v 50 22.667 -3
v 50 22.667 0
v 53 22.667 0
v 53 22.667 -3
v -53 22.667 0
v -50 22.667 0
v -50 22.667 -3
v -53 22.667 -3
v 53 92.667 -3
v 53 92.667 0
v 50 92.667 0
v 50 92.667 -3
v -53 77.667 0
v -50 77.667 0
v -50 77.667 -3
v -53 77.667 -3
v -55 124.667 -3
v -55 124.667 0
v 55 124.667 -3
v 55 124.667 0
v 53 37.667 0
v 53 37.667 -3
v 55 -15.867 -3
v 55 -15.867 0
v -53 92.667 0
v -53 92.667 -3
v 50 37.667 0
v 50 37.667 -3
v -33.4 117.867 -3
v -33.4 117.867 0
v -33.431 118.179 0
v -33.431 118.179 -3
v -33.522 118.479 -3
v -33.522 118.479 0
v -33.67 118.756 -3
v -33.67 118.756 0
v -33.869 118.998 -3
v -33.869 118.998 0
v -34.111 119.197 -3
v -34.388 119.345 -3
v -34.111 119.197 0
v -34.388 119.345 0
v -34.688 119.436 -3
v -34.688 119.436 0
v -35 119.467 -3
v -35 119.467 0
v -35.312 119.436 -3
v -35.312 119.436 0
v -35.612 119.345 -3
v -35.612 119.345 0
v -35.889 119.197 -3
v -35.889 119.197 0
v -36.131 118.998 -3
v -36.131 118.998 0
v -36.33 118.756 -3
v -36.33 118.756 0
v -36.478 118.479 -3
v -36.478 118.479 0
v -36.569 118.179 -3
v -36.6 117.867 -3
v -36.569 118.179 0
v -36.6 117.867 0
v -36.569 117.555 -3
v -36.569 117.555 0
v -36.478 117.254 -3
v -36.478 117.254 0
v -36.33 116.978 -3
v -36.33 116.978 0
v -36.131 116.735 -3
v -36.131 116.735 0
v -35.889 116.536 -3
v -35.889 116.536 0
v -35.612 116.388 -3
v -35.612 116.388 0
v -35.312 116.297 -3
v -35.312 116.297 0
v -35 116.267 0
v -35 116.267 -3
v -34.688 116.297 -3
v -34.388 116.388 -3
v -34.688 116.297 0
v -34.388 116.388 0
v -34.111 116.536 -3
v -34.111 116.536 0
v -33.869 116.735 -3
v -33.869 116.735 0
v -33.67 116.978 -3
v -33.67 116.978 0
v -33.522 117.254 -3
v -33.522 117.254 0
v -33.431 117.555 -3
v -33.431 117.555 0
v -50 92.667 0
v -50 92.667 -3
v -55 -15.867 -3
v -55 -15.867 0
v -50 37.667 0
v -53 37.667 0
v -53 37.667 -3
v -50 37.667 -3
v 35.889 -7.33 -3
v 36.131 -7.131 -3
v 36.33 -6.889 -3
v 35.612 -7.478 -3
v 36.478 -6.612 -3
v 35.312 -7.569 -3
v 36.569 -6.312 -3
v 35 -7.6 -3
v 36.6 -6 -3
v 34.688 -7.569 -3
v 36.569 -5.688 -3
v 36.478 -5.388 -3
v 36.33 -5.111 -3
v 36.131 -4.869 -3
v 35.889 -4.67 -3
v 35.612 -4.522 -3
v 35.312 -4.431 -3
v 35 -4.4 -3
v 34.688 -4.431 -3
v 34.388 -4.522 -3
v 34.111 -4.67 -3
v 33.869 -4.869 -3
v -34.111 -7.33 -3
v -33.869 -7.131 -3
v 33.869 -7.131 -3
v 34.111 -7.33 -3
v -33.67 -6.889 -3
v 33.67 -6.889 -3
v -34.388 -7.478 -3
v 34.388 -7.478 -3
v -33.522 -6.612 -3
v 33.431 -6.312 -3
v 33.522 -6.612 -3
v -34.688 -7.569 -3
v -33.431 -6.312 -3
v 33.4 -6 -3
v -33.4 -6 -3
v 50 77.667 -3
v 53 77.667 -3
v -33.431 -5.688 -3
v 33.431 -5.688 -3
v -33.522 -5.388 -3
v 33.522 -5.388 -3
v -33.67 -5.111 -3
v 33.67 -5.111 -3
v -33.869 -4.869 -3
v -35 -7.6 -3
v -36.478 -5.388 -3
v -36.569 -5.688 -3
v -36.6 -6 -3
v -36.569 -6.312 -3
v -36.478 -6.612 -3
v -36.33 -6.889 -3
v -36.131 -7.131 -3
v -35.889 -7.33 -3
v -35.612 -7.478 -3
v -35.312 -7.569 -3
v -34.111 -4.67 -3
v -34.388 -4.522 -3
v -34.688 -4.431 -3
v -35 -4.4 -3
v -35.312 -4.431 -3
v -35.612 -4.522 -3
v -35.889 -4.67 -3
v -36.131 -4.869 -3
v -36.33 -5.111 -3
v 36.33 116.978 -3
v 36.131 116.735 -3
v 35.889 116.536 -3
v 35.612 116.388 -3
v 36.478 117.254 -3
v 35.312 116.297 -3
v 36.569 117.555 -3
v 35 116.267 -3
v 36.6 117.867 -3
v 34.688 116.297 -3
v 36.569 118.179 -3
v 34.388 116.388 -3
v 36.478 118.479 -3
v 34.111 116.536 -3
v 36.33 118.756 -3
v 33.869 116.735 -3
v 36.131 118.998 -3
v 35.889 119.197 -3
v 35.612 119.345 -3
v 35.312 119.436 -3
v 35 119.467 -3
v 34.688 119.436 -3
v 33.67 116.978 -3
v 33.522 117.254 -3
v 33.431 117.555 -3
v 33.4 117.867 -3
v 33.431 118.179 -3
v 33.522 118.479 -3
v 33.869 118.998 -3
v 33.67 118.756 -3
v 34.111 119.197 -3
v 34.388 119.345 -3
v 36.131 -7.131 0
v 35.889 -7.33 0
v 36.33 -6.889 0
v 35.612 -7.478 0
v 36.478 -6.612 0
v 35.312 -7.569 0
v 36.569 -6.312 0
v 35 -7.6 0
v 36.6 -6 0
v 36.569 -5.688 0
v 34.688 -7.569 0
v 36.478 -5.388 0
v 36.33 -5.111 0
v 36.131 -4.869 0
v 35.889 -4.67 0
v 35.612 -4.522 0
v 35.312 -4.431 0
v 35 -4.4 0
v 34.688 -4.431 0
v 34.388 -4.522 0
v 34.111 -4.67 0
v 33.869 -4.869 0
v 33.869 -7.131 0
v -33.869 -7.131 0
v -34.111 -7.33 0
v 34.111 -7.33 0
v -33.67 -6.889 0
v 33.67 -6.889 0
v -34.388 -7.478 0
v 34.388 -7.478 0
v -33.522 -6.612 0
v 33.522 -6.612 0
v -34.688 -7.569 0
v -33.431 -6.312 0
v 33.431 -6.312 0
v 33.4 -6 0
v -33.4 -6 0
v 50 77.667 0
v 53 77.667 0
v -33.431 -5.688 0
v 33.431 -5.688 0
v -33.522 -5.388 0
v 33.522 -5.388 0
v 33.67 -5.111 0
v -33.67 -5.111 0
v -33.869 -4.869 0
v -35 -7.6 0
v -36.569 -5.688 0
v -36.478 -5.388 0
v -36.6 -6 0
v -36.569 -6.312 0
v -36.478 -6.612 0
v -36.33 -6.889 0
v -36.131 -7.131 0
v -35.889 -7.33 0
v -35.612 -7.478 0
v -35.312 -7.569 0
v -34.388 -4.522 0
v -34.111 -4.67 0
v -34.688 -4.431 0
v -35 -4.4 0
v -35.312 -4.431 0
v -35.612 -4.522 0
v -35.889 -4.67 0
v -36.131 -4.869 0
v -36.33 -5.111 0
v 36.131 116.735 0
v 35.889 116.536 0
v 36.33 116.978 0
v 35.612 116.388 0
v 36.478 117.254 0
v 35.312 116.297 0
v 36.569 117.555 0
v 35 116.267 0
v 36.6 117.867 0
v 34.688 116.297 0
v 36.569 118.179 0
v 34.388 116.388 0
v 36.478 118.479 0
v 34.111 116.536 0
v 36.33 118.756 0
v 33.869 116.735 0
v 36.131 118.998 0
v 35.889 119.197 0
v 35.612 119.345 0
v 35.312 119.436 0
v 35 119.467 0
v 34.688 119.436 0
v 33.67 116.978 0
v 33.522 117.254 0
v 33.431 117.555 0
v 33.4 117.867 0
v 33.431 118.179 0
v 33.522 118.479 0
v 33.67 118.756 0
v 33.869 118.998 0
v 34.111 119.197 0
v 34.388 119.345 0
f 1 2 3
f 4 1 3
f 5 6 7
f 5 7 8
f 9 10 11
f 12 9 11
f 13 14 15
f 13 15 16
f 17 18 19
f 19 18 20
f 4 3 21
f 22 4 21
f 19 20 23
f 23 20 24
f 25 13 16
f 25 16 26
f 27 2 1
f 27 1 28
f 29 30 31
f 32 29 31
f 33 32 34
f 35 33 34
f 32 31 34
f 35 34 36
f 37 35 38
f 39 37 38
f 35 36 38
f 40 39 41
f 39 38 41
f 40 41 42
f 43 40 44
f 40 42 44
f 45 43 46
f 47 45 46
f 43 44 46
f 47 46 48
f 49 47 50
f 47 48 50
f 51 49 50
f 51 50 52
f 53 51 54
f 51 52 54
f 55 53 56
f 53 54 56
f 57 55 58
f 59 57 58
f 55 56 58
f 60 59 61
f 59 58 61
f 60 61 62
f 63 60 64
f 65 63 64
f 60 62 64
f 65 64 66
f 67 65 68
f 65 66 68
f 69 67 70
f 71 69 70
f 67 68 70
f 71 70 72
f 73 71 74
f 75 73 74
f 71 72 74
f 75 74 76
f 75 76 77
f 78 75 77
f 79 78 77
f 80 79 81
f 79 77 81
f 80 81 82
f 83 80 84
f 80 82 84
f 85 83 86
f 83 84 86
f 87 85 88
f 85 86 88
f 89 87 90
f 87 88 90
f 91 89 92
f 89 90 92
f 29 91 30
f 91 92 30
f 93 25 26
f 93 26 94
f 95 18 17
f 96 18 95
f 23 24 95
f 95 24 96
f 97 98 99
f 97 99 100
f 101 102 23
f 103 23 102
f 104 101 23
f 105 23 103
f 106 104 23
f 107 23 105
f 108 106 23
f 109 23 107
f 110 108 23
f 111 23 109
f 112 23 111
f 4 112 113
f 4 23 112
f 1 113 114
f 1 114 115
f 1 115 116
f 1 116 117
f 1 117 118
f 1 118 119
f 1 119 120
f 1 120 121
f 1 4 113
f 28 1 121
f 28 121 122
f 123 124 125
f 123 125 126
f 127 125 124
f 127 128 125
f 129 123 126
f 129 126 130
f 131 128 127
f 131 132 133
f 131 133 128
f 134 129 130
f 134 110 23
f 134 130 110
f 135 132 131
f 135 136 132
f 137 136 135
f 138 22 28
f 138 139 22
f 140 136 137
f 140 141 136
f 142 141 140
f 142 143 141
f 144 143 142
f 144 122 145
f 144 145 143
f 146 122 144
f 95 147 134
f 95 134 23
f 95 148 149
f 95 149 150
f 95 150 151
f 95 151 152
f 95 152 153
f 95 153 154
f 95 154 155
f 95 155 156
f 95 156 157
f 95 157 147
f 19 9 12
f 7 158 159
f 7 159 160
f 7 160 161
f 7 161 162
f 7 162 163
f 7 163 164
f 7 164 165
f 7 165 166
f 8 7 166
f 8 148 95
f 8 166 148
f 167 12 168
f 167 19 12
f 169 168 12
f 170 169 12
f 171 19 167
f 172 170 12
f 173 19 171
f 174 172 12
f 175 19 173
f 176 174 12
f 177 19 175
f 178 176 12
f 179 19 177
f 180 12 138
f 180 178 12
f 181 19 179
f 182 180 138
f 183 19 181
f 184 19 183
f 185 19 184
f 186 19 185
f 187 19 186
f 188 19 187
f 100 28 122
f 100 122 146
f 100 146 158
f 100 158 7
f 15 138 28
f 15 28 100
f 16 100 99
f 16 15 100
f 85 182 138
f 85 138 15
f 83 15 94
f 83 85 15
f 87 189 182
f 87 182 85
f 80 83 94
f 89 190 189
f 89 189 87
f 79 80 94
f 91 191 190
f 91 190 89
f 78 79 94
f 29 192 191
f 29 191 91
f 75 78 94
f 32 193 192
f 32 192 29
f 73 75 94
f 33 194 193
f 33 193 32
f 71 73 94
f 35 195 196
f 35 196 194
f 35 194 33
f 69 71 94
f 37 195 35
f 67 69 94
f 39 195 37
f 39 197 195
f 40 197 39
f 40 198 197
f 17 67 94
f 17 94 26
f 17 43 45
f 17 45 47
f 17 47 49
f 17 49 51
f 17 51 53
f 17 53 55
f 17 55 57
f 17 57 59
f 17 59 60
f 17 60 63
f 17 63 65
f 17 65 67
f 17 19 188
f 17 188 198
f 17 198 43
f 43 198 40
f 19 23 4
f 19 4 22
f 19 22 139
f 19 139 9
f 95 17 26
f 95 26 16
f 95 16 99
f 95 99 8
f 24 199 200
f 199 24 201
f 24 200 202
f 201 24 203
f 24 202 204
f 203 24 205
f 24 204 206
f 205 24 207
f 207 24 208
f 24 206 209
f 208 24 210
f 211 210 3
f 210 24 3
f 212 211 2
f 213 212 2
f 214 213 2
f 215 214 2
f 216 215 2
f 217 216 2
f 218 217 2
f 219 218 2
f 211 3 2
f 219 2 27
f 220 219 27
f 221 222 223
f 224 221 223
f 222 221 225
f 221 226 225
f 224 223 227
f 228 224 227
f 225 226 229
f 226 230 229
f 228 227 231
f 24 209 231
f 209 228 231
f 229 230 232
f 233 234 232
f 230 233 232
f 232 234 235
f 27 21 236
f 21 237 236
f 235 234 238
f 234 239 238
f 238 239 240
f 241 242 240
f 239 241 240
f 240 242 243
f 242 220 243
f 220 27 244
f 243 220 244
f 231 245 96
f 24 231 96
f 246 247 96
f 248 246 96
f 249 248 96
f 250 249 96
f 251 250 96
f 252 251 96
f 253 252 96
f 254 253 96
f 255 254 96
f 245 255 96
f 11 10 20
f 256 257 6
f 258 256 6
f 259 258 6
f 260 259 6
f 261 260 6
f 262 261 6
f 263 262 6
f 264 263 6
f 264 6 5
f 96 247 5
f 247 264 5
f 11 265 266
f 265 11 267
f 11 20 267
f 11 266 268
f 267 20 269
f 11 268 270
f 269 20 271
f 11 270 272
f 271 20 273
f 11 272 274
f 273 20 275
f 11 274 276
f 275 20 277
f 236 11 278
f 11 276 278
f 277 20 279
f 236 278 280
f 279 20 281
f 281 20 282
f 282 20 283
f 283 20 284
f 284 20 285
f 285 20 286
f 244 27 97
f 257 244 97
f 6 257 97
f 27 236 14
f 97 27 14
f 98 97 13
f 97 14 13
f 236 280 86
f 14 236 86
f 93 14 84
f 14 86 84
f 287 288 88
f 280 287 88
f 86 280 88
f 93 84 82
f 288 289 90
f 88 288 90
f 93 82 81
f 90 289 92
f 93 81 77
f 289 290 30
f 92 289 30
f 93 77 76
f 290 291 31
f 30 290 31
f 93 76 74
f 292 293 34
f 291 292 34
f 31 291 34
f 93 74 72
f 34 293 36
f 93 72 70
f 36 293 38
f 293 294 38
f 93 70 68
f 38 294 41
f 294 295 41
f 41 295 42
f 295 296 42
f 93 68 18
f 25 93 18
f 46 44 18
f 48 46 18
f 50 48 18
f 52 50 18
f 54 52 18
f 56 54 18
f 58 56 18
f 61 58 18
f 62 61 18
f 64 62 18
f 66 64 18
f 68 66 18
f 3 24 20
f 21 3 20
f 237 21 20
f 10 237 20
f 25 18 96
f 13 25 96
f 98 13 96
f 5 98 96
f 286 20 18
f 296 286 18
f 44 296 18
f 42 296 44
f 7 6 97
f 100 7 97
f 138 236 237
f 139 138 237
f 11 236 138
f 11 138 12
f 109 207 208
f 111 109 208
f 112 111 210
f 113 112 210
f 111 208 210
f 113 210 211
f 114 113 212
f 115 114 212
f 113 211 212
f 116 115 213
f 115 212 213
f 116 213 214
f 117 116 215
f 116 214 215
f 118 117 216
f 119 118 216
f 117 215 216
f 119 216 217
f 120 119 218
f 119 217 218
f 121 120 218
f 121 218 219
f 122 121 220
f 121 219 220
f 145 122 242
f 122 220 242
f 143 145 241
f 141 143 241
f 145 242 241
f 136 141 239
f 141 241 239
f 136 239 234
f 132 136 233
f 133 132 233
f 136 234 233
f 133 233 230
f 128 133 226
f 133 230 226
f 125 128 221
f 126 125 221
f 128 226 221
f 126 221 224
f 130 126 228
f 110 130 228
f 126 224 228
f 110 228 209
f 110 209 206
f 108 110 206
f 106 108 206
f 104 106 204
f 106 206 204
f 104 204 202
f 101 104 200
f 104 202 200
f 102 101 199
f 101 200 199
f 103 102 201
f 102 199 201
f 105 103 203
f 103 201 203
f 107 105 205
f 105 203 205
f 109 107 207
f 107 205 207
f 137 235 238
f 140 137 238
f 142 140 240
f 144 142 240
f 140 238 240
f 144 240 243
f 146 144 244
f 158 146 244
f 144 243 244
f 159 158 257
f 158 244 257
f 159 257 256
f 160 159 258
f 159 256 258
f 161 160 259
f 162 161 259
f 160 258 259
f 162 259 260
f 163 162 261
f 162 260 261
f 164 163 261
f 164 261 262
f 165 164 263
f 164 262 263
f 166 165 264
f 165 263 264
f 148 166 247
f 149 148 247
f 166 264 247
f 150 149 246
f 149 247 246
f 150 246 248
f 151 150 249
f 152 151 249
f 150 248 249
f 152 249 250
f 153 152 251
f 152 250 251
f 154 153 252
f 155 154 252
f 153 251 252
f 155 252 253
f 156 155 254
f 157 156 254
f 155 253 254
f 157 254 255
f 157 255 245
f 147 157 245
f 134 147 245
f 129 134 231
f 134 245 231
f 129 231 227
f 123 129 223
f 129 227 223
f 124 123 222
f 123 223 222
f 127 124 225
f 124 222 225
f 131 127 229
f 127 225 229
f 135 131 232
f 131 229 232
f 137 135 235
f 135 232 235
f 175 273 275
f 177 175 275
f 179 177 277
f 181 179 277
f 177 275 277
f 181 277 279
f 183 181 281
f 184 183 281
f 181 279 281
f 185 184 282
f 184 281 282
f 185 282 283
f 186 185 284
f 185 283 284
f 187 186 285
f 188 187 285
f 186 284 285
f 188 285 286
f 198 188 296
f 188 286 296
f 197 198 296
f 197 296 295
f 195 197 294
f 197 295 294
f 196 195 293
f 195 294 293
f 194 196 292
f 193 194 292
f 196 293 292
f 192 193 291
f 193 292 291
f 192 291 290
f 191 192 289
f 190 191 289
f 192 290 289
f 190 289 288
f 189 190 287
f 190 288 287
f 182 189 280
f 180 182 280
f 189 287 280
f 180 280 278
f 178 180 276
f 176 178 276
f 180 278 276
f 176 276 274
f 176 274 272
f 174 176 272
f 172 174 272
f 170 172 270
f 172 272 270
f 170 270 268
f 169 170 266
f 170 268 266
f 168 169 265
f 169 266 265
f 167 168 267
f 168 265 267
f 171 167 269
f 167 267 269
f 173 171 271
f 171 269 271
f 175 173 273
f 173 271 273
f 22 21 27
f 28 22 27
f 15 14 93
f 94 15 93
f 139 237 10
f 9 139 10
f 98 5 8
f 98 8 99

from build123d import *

# Parameters (mm, degrees)
SKETCH_1_W      = 100
SKETCH_1_H      = 140.533333334
SKETCH_1_R      = 1.6
EXTRUDE_1_DEPTH = 3
EXTRUDE_2_DEPTH = 3


with BuildPart() as part:
    # 草图1 → 凸台-拉伸1 (new body)
    with BuildSketch(Plane.XY):
        with Locations((0, 54.4)):
            Rectangle(SKETCH_1_W, SKETCH_1_H)
        with Locations((-35, -6)):
            Circle(SKETCH_1_R, mode=Mode.SUBTRACT)
        with Locations((35, -6)):
            Circle(SKETCH_1_R, mode=Mode.SUBTRACT)
        with Locations((-35, 117.866666667)):
            Circle(SKETCH_1_R, mode=Mode.SUBTRACT)
        with Locations((35, 117.866666667)):
            Circle(SKETCH_1_R, mode=Mode.SUBTRACT)
    extrude(amount=-EXTRUDE_1_DEPTH)

    # 草图2 → 凸台-拉伸2 (add)
    with BuildSketch(Plane.XY):
        Polygon((-50, 92.666666667), (-50, 124.666666667), (-55, 124.666666667), (-55, -15.866666667), (-50, -15.866666667), (-50, 22.666666667), (-53, 22.666666667), (-53, 37.666666667), (-50, 37.666666667), (-50, 77.666666667), (-53, 77.666666667), (-53, 92.666666667), align=None)
    extrude_2 = extrude(amount=-EXTRUDE_2_DEPTH)

    # 镜向1: 凸台-拉伸2 across plane
    add(extrude_2.mirror(Plane(origin=(0, 0, 0), x_dir=(0, 0, 1), z_dir=(1, 0, 0))))


solid = part.part
